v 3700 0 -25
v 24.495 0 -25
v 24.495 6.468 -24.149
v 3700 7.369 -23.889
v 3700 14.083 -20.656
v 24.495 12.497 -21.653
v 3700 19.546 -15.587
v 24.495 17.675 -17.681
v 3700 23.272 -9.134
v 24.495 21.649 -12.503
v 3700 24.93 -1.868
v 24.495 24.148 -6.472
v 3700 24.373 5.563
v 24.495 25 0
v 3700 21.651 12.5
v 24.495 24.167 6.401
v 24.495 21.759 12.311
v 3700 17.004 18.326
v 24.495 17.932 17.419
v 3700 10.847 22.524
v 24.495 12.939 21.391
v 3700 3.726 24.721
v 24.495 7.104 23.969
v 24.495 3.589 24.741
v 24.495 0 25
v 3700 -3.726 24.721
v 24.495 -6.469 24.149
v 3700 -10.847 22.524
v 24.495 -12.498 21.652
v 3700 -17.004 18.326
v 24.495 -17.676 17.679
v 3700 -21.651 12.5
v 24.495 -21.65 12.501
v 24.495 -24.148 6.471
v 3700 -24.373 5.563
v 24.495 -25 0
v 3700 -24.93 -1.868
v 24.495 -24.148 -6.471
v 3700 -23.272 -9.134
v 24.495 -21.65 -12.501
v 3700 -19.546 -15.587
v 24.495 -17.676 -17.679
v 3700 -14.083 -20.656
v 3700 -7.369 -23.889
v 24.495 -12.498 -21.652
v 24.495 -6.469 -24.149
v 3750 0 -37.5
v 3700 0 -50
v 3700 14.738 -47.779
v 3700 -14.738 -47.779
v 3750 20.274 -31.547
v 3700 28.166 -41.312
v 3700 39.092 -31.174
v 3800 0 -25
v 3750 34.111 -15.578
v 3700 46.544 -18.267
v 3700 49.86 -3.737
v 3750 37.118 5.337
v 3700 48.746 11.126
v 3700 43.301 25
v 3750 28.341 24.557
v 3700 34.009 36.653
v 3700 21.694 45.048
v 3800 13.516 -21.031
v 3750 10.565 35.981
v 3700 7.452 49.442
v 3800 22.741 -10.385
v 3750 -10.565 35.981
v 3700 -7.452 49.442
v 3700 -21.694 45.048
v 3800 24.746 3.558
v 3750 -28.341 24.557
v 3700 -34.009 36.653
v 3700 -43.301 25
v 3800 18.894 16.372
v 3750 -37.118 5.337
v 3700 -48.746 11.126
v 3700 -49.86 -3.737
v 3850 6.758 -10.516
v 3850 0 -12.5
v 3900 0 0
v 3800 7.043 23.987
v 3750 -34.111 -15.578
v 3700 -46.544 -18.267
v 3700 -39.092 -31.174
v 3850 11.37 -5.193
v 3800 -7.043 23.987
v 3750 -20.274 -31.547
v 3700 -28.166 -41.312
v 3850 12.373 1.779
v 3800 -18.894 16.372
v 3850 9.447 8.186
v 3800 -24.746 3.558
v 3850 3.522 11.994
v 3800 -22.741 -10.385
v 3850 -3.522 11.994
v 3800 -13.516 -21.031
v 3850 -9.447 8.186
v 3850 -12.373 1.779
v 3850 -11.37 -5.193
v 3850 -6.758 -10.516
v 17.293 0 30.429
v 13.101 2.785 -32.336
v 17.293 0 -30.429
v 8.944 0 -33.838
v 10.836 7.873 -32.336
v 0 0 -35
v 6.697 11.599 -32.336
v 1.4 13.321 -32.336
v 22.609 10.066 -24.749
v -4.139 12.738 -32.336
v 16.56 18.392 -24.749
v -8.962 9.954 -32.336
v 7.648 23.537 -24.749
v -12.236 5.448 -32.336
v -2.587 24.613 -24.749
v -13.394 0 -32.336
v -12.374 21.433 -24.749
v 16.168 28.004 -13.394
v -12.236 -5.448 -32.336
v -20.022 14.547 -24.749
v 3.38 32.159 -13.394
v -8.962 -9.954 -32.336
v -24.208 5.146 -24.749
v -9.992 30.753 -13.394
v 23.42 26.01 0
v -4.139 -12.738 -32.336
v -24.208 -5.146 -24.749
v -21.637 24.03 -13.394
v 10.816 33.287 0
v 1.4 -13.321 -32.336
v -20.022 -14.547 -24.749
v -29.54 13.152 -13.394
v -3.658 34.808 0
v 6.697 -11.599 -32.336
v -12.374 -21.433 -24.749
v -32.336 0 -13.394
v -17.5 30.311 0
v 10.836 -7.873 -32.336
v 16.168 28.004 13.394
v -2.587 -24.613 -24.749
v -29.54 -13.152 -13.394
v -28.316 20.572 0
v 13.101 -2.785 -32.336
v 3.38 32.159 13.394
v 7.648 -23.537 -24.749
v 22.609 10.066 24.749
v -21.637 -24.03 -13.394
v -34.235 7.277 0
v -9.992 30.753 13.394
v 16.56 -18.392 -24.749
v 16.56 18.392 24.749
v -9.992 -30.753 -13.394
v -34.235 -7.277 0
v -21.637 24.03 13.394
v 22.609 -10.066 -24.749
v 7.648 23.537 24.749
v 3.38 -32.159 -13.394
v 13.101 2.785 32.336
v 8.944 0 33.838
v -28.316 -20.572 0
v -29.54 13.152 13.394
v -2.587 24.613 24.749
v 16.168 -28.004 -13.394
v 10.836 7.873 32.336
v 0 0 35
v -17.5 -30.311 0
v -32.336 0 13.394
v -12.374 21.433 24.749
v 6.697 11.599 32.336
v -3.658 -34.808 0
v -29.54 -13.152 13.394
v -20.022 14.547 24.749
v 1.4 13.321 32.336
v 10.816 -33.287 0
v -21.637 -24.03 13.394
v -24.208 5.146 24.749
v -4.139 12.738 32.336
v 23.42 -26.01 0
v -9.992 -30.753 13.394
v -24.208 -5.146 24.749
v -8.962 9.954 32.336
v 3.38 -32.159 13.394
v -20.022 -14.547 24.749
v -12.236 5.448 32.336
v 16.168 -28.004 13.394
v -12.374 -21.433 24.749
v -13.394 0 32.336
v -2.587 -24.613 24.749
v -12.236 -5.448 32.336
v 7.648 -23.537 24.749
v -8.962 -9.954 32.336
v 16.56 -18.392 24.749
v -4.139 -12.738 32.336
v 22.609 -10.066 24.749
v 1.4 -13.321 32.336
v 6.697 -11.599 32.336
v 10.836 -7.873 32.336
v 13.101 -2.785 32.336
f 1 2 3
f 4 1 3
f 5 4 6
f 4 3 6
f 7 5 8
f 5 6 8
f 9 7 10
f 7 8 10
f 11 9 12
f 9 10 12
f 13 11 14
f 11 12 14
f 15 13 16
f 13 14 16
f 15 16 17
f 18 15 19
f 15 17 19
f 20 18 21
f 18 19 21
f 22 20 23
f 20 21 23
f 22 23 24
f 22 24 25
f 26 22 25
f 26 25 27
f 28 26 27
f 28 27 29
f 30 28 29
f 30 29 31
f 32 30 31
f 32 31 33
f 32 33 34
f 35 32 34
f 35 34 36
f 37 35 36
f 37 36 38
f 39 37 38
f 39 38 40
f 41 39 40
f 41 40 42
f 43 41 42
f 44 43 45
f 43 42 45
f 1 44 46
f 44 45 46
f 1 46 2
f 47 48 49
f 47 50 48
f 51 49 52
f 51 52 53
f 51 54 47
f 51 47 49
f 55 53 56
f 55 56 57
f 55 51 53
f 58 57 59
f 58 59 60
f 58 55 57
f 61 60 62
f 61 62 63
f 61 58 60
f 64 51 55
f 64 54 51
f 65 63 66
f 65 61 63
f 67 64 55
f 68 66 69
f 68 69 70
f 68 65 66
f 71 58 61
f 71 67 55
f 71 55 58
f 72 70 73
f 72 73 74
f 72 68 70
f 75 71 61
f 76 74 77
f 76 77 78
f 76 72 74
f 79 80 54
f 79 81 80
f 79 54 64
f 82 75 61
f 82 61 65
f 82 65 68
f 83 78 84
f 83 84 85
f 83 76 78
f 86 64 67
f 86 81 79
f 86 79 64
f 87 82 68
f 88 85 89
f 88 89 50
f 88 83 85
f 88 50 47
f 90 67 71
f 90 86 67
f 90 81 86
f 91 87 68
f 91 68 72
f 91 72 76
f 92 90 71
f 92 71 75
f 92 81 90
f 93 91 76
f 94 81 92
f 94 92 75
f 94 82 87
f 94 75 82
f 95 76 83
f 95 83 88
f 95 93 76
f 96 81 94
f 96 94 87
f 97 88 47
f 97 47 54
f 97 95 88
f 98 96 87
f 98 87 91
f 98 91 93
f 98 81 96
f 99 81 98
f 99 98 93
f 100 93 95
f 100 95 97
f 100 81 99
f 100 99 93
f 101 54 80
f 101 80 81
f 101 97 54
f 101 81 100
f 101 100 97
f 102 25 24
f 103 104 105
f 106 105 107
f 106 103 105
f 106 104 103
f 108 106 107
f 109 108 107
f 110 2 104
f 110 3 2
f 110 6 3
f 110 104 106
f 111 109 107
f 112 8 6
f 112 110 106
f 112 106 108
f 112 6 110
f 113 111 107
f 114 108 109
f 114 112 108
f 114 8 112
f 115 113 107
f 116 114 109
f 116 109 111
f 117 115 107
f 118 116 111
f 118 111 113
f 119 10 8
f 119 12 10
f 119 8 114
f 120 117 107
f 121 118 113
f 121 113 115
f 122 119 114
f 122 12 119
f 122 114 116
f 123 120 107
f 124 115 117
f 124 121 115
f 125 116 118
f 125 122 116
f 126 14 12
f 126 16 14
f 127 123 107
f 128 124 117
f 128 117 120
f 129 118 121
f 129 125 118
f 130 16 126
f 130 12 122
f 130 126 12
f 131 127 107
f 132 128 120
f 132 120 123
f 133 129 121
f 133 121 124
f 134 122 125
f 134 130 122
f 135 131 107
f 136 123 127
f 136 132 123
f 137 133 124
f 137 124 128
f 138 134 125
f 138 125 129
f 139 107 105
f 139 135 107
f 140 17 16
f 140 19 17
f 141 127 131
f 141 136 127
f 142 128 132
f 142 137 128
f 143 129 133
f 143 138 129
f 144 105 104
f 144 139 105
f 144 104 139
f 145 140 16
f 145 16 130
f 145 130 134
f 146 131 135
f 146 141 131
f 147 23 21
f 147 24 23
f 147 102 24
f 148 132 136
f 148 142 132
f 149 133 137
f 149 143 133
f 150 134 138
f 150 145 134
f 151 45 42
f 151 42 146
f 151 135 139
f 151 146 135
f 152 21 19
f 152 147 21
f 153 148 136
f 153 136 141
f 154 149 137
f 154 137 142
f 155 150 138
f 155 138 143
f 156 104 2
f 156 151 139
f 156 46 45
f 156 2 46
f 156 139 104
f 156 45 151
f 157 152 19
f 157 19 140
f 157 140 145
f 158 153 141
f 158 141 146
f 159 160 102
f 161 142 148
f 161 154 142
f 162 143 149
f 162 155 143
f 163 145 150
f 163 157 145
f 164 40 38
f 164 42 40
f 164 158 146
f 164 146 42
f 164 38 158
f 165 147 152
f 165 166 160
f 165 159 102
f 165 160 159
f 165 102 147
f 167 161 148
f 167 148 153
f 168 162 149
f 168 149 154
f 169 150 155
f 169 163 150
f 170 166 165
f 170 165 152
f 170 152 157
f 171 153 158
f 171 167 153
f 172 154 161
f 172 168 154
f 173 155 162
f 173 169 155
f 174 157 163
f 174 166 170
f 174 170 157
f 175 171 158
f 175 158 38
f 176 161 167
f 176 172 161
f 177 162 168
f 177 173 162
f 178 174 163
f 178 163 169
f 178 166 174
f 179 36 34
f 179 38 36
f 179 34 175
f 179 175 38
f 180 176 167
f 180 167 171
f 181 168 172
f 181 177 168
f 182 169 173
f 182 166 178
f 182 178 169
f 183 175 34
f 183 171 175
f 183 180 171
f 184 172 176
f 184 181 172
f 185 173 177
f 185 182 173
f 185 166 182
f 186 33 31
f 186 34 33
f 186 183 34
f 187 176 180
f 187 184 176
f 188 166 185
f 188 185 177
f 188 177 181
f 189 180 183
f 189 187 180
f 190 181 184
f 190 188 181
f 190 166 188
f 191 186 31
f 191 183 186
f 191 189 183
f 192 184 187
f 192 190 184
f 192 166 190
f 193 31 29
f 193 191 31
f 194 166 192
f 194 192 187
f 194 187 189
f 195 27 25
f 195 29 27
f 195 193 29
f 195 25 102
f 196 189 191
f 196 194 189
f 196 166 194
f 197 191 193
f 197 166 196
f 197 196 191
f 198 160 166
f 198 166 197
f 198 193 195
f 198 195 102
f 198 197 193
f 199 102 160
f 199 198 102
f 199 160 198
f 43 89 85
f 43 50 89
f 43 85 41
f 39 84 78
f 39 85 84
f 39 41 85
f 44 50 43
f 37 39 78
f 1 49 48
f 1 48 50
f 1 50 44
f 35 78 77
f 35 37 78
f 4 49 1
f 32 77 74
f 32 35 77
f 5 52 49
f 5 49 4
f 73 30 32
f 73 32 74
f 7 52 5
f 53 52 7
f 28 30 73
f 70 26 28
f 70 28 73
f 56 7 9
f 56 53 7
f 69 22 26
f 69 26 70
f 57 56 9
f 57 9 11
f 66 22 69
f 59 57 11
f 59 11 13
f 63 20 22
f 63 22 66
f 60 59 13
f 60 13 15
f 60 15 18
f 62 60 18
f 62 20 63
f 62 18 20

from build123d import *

# Parameters (mm, degrees)
CYLINDER_R     = 25
CYLINDER_DEPTH = 3700


with BuildPart() as sphere:
    # Sphere → Sphere (revolve)
    with BuildSketch(Plane.XZ):
        with BuildLine():
            ThreePointArc((0, -35), (35, 0), (0, 35))
            Line((0, 35), (0, -35))
        make_face()
    revolve(axis=Axis((0, 0, 0), (0, 0, 1)))


with BuildPart() as cone:
    # Cone → Cone (revolve)
    with BuildSketch(Plane(origin=(3700, 0, 0), x_dir=(0, 0, -1), z_dir=(0, -1, 0))):
        Polygon((0, 0), (50, 0), (0, 200), align=None)
    revolve(axis=Axis((3700, 0, 0), (1, 0, 0)))


with BuildPart() as fusion:
    # Cylinder → Cylinder (new body)
    with BuildSketch(Plane(origin=(0, 0, 0), x_dir=(0, 0, -1), z_dir=(1, 0, 0))):
        Circle(CYLINDER_R)
    extrude(amount=CYLINDER_DEPTH)

    # Fusion: union Sphere, Cone
    add(sphere.part)
    add(cone.part)


solid = fusion.part
